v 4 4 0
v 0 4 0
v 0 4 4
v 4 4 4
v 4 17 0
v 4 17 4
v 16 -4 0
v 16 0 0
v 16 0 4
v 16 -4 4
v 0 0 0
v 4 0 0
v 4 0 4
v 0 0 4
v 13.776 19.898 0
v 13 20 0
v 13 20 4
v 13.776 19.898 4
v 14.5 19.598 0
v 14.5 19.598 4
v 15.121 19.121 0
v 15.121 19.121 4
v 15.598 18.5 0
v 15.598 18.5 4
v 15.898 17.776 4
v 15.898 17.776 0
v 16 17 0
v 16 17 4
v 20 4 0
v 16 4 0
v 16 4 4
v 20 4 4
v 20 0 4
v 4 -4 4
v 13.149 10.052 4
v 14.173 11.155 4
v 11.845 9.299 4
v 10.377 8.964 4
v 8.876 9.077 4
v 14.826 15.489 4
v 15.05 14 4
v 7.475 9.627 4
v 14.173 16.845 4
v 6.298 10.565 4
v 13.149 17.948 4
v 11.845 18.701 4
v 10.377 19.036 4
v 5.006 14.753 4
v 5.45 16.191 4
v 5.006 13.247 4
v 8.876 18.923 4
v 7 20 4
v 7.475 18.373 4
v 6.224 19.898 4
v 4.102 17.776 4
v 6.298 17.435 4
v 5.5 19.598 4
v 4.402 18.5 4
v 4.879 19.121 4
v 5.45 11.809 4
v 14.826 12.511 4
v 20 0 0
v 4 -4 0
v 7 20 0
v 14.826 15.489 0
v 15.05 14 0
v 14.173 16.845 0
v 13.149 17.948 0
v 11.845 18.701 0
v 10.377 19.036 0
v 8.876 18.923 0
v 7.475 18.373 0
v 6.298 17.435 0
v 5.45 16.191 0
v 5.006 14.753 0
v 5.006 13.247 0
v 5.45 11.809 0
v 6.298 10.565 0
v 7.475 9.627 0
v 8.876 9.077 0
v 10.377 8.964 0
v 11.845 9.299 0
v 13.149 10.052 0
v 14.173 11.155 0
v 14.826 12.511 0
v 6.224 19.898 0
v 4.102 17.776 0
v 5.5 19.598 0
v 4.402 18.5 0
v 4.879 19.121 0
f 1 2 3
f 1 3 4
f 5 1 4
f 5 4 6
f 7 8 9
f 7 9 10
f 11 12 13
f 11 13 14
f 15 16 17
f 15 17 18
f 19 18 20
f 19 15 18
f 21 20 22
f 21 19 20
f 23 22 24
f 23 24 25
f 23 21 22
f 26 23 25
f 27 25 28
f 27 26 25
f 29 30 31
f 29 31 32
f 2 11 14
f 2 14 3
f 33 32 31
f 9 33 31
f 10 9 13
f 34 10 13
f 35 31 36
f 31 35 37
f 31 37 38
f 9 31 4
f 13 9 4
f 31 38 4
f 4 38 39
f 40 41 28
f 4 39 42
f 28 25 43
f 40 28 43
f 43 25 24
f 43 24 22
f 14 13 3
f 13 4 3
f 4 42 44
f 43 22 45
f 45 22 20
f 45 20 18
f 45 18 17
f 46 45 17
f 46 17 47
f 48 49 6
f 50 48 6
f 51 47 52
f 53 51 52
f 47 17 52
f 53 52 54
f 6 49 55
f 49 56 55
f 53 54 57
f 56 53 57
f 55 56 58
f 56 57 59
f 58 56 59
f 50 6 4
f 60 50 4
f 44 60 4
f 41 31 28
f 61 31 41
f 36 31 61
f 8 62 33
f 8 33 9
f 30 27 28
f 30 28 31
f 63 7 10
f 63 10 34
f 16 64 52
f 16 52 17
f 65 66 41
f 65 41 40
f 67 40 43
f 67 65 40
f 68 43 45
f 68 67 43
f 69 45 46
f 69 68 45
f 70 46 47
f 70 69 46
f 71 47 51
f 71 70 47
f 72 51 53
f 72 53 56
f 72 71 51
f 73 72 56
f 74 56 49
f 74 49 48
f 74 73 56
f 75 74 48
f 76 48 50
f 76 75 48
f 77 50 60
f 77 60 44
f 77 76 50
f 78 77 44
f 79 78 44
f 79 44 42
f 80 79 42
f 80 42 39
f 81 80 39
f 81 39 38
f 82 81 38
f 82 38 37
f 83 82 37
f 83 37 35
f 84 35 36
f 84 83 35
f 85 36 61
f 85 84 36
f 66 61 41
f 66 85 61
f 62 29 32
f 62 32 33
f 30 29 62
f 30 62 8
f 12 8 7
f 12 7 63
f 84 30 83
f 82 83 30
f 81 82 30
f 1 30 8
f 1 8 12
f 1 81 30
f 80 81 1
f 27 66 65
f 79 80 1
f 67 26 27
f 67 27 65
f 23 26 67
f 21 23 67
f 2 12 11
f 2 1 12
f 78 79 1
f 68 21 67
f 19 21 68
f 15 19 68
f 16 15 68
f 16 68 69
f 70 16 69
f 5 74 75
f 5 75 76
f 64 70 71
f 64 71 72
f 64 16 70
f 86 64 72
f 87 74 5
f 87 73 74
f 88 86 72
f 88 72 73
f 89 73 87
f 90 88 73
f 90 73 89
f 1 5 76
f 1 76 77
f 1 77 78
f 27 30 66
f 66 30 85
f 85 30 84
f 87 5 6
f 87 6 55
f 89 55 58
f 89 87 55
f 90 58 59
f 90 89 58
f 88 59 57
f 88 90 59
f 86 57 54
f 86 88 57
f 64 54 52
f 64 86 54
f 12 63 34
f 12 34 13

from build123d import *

# Parameters (mm, degrees)
SKETCH_1_R      = 5.05
EXTRUDE_1_DEPTH = 4


with BuildPart() as part:
    # Эскиз1 → Бобышка-Вытянуть1 (new body)
    with BuildSketch(Plane.XY):
        with BuildLine():
            Line((0, 0), (0, 4))
            Line((0, 4), (4, 4))
            Line((4, 4), (4, 8))
            Line((4, 8), (4, 17))
            ThreePointArc((4, 17), (4.878679656, 19.121320344), (7, 20))
            Line((7, 20), (13, 20))
            ThreePointArc((13, 20), (15.121320344, 19.121320344), (16, 17))
            Line((16, 17), (16, 8))
            Line((16, 8), (16, 4))
            Line((16, 4), (20, 4))
            Line((20, 4), (20, 0))
            Line((20, 0), (16, 0))
            Line((16, 0), (16, -4))
            Line((16, -4), (4, -4))
            Line((4, -4), (4, 0))
            Line((4, 0), (0, 0))
        make_face()
        with Locations((10, 14)):
            Circle(SKETCH_1_R, mode=Mode.SUBTRACT)
    extrude(amount=EXTRUDE_1_DEPTH)


solid = part.part
